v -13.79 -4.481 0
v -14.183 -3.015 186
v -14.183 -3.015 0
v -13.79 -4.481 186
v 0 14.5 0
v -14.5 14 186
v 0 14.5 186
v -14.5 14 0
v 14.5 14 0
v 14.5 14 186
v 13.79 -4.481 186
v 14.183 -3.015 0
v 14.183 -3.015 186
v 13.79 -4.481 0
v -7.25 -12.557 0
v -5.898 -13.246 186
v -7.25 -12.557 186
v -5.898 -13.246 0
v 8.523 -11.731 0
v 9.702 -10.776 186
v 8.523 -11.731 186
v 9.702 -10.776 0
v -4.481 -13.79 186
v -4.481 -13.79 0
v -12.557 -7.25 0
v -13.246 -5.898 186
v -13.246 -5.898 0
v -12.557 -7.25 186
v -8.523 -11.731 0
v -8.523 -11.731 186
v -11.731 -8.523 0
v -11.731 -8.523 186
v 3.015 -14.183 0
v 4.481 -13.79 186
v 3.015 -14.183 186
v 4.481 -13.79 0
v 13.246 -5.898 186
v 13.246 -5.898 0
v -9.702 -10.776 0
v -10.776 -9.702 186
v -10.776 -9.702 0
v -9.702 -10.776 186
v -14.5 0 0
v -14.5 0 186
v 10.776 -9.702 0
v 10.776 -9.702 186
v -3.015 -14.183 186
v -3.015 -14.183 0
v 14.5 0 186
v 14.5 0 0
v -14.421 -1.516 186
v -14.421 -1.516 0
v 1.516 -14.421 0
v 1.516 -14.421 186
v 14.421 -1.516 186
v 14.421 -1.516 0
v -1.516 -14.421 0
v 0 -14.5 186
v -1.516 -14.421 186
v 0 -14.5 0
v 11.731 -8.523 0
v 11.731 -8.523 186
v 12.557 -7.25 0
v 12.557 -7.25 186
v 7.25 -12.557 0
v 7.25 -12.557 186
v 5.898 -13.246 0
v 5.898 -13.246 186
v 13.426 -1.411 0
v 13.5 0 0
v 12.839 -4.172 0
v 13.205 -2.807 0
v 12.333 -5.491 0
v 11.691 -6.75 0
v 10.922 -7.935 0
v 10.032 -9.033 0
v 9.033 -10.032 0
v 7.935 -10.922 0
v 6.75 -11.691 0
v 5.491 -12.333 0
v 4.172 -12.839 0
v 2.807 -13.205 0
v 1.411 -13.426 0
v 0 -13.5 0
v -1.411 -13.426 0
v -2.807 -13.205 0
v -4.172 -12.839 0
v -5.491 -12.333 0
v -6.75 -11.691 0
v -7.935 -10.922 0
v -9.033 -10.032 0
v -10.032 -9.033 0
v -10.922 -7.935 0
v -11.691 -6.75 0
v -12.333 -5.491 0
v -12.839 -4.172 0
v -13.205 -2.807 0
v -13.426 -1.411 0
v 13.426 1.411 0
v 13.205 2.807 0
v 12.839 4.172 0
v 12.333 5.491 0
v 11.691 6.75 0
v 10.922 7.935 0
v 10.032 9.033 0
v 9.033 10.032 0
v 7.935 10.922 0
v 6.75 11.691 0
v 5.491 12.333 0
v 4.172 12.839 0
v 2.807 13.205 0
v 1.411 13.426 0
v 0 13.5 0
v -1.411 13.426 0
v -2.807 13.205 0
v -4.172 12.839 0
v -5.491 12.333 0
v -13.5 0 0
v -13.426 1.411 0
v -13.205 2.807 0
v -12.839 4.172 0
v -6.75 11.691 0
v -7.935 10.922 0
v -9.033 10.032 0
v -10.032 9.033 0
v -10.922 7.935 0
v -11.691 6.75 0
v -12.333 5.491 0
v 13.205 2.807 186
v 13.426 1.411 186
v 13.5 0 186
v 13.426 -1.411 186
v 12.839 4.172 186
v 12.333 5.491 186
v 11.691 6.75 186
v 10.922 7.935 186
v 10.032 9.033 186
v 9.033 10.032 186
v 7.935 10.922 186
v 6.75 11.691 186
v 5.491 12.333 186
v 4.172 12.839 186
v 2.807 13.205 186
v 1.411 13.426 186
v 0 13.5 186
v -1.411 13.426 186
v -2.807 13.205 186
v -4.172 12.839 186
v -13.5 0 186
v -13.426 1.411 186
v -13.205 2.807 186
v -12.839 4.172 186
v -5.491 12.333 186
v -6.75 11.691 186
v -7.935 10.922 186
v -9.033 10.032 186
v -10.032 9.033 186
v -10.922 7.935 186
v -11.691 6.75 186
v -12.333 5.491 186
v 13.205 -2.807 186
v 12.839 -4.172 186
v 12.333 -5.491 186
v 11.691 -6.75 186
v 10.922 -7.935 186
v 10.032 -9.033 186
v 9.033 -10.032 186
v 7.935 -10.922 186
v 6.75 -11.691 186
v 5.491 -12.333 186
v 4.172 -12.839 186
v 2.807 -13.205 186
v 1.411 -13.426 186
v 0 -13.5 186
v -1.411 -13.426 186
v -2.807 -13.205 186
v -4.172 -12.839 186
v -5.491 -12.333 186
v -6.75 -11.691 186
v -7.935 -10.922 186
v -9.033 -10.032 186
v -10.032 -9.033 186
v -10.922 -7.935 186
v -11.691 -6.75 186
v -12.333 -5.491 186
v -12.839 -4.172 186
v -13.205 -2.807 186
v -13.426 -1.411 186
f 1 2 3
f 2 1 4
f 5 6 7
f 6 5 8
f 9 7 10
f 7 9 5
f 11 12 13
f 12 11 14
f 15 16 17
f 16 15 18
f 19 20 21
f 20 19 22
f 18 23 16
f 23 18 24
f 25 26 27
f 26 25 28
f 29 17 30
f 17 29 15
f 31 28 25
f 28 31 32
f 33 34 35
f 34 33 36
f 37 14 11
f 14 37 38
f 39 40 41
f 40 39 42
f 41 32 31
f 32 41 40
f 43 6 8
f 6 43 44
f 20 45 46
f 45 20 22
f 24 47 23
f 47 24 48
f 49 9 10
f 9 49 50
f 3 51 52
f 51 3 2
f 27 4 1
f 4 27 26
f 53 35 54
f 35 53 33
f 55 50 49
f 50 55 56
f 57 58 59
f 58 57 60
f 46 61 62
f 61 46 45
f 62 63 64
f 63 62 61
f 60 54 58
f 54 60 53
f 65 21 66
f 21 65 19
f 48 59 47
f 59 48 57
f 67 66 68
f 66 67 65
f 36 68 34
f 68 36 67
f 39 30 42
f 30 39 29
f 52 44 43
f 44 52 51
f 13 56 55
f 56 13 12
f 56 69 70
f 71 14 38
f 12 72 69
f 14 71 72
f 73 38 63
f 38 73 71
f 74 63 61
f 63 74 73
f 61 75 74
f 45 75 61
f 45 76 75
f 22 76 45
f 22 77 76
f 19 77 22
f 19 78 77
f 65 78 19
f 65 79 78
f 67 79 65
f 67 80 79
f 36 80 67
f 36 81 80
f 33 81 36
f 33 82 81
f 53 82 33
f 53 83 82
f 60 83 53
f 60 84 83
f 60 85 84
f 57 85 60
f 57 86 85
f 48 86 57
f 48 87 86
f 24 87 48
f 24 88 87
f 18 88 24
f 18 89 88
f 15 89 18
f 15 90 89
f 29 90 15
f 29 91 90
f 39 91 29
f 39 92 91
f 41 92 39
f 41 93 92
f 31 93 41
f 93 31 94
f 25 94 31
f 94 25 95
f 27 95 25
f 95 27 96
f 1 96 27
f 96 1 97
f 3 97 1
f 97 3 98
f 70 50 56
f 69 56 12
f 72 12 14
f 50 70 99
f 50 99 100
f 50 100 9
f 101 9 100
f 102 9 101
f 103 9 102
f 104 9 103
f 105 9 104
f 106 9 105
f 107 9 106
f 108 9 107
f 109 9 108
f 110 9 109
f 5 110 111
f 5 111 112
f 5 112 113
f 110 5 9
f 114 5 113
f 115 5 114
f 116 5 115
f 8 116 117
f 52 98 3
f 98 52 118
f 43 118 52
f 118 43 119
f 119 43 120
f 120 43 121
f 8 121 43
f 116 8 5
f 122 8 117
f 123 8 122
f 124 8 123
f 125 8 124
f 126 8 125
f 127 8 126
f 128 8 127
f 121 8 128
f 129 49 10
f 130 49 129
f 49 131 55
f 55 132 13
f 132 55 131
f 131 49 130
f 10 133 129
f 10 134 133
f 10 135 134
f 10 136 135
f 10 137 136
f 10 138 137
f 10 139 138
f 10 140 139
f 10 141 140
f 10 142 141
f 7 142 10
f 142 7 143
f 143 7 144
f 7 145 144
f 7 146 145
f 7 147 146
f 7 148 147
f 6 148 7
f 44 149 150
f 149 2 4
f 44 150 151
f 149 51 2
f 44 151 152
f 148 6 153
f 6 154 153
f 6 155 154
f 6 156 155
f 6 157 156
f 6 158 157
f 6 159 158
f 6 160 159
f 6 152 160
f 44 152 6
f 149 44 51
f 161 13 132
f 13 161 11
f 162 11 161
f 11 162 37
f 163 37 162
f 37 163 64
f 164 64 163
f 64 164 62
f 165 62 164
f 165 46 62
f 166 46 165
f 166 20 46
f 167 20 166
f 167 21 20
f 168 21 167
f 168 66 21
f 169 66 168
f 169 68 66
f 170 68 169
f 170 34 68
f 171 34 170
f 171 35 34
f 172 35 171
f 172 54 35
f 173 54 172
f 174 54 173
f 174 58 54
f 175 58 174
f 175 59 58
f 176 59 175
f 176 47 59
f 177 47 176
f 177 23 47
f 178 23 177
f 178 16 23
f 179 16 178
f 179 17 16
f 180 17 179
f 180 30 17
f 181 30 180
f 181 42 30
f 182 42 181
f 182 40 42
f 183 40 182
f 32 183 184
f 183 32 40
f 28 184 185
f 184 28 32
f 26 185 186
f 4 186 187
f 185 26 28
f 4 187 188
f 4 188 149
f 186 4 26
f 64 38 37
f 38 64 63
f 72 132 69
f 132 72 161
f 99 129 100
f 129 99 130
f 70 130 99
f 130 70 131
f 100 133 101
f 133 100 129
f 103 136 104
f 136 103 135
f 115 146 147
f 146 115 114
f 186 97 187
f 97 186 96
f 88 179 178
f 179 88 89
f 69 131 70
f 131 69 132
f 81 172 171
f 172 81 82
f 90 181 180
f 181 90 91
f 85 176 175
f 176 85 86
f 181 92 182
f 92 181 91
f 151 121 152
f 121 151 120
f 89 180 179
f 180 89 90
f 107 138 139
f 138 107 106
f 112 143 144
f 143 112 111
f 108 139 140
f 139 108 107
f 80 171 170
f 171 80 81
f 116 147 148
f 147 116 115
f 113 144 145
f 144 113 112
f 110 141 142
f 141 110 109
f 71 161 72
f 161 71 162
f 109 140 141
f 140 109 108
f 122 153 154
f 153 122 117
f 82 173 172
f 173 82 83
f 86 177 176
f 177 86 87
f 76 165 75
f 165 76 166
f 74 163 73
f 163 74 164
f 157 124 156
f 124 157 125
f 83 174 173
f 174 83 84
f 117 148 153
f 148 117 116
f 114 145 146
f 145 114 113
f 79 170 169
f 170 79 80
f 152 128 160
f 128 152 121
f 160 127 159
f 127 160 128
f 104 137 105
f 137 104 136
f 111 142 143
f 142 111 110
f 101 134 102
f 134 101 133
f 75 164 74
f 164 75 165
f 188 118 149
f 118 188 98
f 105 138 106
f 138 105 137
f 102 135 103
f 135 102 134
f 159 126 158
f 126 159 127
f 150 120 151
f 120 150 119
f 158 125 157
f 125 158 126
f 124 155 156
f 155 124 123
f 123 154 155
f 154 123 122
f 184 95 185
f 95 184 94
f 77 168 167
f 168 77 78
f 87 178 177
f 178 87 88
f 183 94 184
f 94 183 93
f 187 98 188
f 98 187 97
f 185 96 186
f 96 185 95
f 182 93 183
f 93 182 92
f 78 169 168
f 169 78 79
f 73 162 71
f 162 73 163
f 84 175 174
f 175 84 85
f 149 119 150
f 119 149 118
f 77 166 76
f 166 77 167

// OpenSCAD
ROUNDNESS = 60;
TOLERANCE = .5;

can_r = 13;
can_h = 14;

wall_thickness = 1;

dispenser_x = (can_r + wall_thickness + TOLERANCE) * 2;
dispenser_y = can_r;
dispenser_z = (can_h + wall_thickness + TOLERANCE) * 12;

difference() {
    hull() {
        translate([-(dispenser_x / 2), wall_thickness, 0]) {
            cube([dispenser_x, dispenser_y, dispenser_z]);
        }
        cylinder(h = dispenser_z, r = (can_r + wall_thickness + TOLERANCE), $fn=ROUNDNESS);
    }
    cylinder(h = dispenser_z, r = (can_r + TOLERANCE), $fn=ROUNDNESS);
}
